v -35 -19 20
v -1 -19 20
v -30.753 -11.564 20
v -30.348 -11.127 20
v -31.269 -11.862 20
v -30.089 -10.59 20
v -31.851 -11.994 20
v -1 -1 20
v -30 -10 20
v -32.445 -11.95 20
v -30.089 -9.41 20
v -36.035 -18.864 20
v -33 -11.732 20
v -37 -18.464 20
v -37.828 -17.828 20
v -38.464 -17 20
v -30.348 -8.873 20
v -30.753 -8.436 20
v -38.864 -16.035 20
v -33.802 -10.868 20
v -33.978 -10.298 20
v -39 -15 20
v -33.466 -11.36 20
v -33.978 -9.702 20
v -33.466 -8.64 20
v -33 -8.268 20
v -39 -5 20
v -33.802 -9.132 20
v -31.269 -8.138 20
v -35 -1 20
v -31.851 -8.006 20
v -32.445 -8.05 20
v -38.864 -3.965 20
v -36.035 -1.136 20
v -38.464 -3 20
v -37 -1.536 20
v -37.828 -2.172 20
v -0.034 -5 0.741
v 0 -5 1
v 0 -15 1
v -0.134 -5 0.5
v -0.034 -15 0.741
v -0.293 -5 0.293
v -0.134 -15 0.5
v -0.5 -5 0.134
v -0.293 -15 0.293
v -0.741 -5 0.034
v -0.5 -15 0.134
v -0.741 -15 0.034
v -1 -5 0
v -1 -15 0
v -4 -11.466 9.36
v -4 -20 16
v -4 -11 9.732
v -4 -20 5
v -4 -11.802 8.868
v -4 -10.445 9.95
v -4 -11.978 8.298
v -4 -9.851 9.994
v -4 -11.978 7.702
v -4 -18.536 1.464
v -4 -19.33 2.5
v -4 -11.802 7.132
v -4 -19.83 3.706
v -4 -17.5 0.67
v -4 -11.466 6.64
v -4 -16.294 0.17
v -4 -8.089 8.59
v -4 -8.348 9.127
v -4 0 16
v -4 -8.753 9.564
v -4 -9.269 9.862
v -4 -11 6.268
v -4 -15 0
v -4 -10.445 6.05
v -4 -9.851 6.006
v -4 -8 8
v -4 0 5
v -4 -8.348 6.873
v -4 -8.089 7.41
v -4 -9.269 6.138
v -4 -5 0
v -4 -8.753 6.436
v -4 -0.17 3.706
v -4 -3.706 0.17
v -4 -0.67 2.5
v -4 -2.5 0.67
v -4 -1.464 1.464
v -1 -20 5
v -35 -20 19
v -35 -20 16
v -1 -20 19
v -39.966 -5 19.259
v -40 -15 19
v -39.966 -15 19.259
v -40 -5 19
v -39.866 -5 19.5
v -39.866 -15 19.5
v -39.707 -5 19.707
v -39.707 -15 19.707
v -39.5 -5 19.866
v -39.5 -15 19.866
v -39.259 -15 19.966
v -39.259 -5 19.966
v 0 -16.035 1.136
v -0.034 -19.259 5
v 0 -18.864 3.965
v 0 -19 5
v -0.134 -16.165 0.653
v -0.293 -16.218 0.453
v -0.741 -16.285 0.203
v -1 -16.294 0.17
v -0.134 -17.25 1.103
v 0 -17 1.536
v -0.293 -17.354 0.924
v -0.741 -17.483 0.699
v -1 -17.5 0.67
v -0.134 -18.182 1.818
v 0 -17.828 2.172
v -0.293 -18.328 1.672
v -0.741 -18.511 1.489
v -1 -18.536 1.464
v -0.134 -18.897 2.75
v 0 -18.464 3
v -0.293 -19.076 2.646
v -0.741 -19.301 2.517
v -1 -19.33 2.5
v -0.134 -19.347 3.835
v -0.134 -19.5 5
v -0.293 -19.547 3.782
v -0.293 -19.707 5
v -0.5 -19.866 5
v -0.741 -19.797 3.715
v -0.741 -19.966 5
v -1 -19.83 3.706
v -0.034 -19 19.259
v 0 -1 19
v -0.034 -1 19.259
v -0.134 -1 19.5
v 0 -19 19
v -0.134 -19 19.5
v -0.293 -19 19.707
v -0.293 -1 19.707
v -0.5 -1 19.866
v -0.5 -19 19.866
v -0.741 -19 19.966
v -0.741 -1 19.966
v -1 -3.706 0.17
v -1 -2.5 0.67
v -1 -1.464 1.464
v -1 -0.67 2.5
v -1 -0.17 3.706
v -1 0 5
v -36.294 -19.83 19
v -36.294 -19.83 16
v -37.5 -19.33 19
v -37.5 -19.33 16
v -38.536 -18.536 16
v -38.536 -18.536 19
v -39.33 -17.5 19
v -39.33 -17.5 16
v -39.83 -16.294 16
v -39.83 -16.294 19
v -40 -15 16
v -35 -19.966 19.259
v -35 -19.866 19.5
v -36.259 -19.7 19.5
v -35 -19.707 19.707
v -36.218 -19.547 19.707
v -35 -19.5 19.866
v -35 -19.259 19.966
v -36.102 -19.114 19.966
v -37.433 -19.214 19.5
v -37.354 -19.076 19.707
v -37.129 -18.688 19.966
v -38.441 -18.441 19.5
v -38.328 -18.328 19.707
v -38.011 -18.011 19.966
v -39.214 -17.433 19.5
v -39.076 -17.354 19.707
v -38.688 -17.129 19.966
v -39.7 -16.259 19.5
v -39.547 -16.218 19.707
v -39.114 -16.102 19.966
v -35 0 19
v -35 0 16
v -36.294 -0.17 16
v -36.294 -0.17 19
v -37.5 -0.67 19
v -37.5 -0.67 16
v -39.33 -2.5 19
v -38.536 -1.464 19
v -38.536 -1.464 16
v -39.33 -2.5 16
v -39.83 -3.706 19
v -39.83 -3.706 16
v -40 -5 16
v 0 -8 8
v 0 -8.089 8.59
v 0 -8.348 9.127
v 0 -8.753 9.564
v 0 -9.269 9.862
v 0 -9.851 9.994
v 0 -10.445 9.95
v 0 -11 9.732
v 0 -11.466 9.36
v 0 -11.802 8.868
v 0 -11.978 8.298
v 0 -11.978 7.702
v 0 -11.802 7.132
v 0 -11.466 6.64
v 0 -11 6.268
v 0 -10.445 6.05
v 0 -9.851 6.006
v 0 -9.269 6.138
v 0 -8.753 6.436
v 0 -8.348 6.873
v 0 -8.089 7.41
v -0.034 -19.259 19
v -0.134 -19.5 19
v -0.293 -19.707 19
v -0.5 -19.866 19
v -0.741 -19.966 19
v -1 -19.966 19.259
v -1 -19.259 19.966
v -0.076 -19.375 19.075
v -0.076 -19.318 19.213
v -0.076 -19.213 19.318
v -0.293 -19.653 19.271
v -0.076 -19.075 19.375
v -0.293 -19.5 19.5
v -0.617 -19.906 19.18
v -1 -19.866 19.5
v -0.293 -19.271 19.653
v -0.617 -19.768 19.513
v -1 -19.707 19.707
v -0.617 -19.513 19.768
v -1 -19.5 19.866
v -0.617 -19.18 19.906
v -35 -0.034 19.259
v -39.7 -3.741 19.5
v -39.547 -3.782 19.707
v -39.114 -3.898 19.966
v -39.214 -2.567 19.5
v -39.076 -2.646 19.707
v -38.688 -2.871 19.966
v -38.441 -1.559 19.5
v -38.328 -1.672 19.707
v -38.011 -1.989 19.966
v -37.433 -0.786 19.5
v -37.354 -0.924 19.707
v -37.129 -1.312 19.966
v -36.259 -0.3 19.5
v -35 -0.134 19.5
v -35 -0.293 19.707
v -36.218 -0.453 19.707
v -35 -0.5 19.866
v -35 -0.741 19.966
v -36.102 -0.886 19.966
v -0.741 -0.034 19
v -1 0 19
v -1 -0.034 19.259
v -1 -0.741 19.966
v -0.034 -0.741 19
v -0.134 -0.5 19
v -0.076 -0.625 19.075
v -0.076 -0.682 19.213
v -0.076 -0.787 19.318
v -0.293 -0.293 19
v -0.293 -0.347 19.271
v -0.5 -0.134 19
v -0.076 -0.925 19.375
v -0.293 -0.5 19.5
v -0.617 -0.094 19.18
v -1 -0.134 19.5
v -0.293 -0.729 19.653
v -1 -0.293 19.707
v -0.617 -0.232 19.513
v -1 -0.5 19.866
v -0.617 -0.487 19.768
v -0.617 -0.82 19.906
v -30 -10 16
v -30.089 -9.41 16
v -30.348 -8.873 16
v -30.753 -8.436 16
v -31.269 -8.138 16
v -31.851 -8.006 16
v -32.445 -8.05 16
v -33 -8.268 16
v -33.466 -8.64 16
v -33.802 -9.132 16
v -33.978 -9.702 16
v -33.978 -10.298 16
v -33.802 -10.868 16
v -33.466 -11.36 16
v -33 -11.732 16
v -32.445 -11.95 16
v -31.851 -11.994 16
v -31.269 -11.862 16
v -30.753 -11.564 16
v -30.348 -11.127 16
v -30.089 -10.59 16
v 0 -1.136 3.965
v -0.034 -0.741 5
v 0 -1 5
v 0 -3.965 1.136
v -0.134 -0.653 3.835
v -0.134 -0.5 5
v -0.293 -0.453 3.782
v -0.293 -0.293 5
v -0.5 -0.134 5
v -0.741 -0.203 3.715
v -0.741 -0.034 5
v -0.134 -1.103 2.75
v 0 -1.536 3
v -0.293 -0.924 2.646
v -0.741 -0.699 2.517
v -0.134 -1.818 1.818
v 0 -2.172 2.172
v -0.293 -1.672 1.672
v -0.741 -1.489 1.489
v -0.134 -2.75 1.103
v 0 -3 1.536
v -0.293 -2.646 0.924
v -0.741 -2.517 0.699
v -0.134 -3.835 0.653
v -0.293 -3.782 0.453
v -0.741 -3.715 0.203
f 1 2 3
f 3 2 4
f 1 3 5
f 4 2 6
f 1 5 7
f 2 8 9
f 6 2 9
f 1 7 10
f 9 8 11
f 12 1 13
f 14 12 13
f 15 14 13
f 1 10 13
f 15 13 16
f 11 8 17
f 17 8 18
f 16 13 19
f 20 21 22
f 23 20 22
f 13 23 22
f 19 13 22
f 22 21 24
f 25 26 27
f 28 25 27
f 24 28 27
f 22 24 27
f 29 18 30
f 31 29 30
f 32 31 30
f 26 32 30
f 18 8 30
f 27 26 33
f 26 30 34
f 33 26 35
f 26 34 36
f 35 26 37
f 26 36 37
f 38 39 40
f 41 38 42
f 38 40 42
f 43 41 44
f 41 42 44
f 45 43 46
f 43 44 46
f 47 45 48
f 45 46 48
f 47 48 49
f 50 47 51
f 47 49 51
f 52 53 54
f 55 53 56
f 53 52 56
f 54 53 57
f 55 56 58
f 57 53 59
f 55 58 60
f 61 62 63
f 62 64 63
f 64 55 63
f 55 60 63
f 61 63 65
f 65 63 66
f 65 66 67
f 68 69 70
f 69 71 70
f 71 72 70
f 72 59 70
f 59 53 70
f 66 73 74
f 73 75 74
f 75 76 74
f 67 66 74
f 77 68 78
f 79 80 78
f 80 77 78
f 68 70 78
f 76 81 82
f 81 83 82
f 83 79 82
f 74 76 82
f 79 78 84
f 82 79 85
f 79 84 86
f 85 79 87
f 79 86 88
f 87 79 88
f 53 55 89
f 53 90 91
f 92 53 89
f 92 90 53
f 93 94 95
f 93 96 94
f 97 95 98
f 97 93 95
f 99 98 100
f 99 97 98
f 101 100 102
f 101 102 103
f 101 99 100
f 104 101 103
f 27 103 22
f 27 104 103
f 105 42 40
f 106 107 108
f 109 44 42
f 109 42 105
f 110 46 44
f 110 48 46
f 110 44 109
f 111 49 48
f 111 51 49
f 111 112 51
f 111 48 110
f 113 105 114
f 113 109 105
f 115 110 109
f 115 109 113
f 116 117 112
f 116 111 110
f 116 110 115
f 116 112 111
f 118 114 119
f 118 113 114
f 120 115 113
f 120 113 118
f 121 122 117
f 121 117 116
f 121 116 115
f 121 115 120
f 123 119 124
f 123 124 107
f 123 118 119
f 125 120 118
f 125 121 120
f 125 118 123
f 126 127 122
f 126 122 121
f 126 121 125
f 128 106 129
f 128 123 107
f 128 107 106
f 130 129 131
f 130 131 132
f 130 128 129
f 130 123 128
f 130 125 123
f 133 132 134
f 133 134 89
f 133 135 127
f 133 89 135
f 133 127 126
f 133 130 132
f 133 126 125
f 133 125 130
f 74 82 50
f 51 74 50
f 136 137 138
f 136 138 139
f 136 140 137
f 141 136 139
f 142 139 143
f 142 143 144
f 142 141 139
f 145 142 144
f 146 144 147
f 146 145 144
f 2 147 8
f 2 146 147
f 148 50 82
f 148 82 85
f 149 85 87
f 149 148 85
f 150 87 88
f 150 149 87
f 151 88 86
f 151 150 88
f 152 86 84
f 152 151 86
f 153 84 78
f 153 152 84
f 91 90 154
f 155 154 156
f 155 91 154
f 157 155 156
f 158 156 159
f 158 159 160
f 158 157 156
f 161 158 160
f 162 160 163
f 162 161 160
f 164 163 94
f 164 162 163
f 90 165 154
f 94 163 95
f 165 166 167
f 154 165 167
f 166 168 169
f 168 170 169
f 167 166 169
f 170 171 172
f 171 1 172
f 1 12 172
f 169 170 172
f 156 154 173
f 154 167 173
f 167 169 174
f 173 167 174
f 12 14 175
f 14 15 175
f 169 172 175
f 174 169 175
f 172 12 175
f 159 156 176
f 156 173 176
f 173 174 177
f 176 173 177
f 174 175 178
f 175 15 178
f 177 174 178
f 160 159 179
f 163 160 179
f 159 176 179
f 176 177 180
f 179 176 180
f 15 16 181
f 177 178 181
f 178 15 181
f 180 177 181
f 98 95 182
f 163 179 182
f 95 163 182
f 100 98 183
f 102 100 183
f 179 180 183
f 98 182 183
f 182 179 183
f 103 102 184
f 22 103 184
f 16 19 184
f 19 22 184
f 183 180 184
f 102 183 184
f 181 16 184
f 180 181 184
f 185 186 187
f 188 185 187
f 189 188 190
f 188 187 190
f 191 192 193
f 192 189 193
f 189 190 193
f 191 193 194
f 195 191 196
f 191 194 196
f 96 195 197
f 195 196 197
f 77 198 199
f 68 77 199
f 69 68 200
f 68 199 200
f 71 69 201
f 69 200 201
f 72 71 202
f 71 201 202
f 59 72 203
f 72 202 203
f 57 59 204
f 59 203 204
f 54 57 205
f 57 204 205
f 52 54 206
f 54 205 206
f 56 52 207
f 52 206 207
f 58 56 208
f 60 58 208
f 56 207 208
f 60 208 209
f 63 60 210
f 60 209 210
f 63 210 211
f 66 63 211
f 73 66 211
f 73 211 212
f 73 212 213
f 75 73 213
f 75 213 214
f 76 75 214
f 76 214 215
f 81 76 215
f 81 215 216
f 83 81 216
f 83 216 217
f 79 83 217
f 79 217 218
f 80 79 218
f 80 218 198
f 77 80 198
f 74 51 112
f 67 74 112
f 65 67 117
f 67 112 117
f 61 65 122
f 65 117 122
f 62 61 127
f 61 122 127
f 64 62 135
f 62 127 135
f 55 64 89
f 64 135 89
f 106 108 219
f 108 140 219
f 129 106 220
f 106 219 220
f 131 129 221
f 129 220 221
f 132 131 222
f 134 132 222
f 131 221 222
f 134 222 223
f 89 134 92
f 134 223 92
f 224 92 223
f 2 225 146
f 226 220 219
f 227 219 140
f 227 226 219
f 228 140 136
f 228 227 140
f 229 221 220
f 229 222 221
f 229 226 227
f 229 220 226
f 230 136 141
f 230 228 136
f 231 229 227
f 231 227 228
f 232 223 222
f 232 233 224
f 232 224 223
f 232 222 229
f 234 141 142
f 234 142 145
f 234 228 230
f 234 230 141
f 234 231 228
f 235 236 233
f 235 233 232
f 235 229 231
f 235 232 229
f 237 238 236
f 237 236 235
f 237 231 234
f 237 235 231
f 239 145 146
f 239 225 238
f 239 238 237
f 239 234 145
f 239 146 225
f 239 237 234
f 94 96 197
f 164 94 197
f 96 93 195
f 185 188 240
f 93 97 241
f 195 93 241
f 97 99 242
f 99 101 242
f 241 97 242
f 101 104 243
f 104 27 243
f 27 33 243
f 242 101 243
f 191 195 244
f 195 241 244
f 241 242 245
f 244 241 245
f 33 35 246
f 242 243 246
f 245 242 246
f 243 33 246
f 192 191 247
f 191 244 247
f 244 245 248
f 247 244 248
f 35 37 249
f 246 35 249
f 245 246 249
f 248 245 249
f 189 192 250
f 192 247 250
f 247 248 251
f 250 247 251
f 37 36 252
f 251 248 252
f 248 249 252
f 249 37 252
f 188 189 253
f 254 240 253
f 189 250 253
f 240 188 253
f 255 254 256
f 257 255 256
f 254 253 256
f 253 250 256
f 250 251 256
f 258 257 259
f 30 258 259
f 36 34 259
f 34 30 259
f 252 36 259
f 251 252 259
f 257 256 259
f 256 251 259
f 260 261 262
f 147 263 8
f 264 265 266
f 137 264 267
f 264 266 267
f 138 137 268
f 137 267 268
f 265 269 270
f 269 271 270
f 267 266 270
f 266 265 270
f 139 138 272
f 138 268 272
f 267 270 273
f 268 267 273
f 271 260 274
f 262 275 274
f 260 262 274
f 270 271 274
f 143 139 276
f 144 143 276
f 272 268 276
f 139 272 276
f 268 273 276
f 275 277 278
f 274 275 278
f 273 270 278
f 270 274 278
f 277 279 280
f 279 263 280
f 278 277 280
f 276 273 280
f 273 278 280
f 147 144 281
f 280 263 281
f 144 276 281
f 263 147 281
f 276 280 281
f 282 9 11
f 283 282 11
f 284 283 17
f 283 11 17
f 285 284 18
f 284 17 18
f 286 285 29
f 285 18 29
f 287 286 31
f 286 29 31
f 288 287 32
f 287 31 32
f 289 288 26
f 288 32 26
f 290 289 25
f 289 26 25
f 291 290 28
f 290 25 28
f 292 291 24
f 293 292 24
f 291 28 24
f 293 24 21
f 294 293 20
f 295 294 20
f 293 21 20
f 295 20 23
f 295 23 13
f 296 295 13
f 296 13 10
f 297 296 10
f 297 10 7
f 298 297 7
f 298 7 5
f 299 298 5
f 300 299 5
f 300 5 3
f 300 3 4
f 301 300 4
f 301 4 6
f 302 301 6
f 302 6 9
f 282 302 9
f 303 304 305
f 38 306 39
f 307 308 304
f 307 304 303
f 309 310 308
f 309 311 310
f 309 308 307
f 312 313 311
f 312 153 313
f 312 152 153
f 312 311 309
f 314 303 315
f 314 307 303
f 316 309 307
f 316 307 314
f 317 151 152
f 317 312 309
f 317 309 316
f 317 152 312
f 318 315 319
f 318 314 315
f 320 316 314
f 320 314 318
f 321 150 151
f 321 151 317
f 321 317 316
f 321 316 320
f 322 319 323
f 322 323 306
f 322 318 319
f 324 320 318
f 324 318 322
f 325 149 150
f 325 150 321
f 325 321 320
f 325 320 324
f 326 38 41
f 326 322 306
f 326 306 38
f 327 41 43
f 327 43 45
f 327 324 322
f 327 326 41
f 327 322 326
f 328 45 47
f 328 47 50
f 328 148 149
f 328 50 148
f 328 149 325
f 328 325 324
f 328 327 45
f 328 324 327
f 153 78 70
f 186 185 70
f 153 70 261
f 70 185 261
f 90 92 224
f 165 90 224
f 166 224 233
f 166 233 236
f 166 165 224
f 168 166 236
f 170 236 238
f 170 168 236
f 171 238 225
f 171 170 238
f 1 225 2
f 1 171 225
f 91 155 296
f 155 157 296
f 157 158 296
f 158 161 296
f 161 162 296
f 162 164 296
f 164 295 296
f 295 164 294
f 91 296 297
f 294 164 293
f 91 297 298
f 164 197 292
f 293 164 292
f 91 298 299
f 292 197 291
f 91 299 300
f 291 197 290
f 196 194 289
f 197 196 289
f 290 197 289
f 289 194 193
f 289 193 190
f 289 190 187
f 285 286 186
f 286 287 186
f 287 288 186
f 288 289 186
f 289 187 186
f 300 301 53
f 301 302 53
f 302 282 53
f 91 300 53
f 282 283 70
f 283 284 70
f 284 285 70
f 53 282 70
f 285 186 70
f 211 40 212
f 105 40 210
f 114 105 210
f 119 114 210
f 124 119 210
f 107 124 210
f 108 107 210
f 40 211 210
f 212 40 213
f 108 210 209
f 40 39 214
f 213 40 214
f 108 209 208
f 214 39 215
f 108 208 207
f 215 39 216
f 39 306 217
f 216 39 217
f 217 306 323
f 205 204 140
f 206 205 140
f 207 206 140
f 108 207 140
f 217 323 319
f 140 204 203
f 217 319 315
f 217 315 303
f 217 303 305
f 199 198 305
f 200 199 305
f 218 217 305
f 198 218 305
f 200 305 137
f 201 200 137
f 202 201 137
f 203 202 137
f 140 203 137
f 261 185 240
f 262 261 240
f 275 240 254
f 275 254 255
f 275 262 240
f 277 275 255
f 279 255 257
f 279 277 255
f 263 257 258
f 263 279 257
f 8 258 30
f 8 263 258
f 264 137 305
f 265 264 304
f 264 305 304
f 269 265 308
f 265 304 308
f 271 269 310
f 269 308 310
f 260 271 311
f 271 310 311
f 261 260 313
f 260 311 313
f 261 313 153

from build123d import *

# Parameters (mm, degrees)
F1_DEPTH = 20
F2_R     = 2
F3_DEPTH = 25
F4_R     = 2
F5_DEPTH = 25
F6_R     = 5
F7_R     = 1


with BuildPart() as f1:
    # F0 (on Front) → F1 (new body)
    with BuildSketch(Plane.XZ):
        Polygon((-4, 0), (0, 0), (0, 20), (-40, 20), (-40, 16), (-4, 16), align=None)
    extrude(amount=F1_DEPTH)

    # F2 (on face) → F3 (cut)
    with BuildSketch(Plane.XY.offset(20)):
        with Locations((-32, -10)):
            Circle(F2_R)
    extrude(amount=-F3_DEPTH, mode=Mode.SUBTRACT)

    # F4 (on face) → F5 (cut)
    with BuildSketch(Plane.YZ):
        with Locations((-10, 8)):
            Circle(F4_R)
    extrude(amount=-F5_DEPTH, mode=Mode.SUBTRACT)

    # F6
    f6_edges = [f1.edges().sort_by_distance(p)[0] for p in [
        (-2, -20, 0),
        (-2, 0, 0),
        (-40, -20, 18),
        (-40, 0, 18),
    ]]
    fillet(f6_edges, radius=F6_R)

    # F7
    f7_edges = [f1.edges().sort_by_distance(p)[0] for p in [
        (-17.5, -20, 20),
        (0, -20, 12.5),
        (0, -10, 20),
    ]]
    fillet(f7_edges, radius=F7_R)


solid = f1.part
